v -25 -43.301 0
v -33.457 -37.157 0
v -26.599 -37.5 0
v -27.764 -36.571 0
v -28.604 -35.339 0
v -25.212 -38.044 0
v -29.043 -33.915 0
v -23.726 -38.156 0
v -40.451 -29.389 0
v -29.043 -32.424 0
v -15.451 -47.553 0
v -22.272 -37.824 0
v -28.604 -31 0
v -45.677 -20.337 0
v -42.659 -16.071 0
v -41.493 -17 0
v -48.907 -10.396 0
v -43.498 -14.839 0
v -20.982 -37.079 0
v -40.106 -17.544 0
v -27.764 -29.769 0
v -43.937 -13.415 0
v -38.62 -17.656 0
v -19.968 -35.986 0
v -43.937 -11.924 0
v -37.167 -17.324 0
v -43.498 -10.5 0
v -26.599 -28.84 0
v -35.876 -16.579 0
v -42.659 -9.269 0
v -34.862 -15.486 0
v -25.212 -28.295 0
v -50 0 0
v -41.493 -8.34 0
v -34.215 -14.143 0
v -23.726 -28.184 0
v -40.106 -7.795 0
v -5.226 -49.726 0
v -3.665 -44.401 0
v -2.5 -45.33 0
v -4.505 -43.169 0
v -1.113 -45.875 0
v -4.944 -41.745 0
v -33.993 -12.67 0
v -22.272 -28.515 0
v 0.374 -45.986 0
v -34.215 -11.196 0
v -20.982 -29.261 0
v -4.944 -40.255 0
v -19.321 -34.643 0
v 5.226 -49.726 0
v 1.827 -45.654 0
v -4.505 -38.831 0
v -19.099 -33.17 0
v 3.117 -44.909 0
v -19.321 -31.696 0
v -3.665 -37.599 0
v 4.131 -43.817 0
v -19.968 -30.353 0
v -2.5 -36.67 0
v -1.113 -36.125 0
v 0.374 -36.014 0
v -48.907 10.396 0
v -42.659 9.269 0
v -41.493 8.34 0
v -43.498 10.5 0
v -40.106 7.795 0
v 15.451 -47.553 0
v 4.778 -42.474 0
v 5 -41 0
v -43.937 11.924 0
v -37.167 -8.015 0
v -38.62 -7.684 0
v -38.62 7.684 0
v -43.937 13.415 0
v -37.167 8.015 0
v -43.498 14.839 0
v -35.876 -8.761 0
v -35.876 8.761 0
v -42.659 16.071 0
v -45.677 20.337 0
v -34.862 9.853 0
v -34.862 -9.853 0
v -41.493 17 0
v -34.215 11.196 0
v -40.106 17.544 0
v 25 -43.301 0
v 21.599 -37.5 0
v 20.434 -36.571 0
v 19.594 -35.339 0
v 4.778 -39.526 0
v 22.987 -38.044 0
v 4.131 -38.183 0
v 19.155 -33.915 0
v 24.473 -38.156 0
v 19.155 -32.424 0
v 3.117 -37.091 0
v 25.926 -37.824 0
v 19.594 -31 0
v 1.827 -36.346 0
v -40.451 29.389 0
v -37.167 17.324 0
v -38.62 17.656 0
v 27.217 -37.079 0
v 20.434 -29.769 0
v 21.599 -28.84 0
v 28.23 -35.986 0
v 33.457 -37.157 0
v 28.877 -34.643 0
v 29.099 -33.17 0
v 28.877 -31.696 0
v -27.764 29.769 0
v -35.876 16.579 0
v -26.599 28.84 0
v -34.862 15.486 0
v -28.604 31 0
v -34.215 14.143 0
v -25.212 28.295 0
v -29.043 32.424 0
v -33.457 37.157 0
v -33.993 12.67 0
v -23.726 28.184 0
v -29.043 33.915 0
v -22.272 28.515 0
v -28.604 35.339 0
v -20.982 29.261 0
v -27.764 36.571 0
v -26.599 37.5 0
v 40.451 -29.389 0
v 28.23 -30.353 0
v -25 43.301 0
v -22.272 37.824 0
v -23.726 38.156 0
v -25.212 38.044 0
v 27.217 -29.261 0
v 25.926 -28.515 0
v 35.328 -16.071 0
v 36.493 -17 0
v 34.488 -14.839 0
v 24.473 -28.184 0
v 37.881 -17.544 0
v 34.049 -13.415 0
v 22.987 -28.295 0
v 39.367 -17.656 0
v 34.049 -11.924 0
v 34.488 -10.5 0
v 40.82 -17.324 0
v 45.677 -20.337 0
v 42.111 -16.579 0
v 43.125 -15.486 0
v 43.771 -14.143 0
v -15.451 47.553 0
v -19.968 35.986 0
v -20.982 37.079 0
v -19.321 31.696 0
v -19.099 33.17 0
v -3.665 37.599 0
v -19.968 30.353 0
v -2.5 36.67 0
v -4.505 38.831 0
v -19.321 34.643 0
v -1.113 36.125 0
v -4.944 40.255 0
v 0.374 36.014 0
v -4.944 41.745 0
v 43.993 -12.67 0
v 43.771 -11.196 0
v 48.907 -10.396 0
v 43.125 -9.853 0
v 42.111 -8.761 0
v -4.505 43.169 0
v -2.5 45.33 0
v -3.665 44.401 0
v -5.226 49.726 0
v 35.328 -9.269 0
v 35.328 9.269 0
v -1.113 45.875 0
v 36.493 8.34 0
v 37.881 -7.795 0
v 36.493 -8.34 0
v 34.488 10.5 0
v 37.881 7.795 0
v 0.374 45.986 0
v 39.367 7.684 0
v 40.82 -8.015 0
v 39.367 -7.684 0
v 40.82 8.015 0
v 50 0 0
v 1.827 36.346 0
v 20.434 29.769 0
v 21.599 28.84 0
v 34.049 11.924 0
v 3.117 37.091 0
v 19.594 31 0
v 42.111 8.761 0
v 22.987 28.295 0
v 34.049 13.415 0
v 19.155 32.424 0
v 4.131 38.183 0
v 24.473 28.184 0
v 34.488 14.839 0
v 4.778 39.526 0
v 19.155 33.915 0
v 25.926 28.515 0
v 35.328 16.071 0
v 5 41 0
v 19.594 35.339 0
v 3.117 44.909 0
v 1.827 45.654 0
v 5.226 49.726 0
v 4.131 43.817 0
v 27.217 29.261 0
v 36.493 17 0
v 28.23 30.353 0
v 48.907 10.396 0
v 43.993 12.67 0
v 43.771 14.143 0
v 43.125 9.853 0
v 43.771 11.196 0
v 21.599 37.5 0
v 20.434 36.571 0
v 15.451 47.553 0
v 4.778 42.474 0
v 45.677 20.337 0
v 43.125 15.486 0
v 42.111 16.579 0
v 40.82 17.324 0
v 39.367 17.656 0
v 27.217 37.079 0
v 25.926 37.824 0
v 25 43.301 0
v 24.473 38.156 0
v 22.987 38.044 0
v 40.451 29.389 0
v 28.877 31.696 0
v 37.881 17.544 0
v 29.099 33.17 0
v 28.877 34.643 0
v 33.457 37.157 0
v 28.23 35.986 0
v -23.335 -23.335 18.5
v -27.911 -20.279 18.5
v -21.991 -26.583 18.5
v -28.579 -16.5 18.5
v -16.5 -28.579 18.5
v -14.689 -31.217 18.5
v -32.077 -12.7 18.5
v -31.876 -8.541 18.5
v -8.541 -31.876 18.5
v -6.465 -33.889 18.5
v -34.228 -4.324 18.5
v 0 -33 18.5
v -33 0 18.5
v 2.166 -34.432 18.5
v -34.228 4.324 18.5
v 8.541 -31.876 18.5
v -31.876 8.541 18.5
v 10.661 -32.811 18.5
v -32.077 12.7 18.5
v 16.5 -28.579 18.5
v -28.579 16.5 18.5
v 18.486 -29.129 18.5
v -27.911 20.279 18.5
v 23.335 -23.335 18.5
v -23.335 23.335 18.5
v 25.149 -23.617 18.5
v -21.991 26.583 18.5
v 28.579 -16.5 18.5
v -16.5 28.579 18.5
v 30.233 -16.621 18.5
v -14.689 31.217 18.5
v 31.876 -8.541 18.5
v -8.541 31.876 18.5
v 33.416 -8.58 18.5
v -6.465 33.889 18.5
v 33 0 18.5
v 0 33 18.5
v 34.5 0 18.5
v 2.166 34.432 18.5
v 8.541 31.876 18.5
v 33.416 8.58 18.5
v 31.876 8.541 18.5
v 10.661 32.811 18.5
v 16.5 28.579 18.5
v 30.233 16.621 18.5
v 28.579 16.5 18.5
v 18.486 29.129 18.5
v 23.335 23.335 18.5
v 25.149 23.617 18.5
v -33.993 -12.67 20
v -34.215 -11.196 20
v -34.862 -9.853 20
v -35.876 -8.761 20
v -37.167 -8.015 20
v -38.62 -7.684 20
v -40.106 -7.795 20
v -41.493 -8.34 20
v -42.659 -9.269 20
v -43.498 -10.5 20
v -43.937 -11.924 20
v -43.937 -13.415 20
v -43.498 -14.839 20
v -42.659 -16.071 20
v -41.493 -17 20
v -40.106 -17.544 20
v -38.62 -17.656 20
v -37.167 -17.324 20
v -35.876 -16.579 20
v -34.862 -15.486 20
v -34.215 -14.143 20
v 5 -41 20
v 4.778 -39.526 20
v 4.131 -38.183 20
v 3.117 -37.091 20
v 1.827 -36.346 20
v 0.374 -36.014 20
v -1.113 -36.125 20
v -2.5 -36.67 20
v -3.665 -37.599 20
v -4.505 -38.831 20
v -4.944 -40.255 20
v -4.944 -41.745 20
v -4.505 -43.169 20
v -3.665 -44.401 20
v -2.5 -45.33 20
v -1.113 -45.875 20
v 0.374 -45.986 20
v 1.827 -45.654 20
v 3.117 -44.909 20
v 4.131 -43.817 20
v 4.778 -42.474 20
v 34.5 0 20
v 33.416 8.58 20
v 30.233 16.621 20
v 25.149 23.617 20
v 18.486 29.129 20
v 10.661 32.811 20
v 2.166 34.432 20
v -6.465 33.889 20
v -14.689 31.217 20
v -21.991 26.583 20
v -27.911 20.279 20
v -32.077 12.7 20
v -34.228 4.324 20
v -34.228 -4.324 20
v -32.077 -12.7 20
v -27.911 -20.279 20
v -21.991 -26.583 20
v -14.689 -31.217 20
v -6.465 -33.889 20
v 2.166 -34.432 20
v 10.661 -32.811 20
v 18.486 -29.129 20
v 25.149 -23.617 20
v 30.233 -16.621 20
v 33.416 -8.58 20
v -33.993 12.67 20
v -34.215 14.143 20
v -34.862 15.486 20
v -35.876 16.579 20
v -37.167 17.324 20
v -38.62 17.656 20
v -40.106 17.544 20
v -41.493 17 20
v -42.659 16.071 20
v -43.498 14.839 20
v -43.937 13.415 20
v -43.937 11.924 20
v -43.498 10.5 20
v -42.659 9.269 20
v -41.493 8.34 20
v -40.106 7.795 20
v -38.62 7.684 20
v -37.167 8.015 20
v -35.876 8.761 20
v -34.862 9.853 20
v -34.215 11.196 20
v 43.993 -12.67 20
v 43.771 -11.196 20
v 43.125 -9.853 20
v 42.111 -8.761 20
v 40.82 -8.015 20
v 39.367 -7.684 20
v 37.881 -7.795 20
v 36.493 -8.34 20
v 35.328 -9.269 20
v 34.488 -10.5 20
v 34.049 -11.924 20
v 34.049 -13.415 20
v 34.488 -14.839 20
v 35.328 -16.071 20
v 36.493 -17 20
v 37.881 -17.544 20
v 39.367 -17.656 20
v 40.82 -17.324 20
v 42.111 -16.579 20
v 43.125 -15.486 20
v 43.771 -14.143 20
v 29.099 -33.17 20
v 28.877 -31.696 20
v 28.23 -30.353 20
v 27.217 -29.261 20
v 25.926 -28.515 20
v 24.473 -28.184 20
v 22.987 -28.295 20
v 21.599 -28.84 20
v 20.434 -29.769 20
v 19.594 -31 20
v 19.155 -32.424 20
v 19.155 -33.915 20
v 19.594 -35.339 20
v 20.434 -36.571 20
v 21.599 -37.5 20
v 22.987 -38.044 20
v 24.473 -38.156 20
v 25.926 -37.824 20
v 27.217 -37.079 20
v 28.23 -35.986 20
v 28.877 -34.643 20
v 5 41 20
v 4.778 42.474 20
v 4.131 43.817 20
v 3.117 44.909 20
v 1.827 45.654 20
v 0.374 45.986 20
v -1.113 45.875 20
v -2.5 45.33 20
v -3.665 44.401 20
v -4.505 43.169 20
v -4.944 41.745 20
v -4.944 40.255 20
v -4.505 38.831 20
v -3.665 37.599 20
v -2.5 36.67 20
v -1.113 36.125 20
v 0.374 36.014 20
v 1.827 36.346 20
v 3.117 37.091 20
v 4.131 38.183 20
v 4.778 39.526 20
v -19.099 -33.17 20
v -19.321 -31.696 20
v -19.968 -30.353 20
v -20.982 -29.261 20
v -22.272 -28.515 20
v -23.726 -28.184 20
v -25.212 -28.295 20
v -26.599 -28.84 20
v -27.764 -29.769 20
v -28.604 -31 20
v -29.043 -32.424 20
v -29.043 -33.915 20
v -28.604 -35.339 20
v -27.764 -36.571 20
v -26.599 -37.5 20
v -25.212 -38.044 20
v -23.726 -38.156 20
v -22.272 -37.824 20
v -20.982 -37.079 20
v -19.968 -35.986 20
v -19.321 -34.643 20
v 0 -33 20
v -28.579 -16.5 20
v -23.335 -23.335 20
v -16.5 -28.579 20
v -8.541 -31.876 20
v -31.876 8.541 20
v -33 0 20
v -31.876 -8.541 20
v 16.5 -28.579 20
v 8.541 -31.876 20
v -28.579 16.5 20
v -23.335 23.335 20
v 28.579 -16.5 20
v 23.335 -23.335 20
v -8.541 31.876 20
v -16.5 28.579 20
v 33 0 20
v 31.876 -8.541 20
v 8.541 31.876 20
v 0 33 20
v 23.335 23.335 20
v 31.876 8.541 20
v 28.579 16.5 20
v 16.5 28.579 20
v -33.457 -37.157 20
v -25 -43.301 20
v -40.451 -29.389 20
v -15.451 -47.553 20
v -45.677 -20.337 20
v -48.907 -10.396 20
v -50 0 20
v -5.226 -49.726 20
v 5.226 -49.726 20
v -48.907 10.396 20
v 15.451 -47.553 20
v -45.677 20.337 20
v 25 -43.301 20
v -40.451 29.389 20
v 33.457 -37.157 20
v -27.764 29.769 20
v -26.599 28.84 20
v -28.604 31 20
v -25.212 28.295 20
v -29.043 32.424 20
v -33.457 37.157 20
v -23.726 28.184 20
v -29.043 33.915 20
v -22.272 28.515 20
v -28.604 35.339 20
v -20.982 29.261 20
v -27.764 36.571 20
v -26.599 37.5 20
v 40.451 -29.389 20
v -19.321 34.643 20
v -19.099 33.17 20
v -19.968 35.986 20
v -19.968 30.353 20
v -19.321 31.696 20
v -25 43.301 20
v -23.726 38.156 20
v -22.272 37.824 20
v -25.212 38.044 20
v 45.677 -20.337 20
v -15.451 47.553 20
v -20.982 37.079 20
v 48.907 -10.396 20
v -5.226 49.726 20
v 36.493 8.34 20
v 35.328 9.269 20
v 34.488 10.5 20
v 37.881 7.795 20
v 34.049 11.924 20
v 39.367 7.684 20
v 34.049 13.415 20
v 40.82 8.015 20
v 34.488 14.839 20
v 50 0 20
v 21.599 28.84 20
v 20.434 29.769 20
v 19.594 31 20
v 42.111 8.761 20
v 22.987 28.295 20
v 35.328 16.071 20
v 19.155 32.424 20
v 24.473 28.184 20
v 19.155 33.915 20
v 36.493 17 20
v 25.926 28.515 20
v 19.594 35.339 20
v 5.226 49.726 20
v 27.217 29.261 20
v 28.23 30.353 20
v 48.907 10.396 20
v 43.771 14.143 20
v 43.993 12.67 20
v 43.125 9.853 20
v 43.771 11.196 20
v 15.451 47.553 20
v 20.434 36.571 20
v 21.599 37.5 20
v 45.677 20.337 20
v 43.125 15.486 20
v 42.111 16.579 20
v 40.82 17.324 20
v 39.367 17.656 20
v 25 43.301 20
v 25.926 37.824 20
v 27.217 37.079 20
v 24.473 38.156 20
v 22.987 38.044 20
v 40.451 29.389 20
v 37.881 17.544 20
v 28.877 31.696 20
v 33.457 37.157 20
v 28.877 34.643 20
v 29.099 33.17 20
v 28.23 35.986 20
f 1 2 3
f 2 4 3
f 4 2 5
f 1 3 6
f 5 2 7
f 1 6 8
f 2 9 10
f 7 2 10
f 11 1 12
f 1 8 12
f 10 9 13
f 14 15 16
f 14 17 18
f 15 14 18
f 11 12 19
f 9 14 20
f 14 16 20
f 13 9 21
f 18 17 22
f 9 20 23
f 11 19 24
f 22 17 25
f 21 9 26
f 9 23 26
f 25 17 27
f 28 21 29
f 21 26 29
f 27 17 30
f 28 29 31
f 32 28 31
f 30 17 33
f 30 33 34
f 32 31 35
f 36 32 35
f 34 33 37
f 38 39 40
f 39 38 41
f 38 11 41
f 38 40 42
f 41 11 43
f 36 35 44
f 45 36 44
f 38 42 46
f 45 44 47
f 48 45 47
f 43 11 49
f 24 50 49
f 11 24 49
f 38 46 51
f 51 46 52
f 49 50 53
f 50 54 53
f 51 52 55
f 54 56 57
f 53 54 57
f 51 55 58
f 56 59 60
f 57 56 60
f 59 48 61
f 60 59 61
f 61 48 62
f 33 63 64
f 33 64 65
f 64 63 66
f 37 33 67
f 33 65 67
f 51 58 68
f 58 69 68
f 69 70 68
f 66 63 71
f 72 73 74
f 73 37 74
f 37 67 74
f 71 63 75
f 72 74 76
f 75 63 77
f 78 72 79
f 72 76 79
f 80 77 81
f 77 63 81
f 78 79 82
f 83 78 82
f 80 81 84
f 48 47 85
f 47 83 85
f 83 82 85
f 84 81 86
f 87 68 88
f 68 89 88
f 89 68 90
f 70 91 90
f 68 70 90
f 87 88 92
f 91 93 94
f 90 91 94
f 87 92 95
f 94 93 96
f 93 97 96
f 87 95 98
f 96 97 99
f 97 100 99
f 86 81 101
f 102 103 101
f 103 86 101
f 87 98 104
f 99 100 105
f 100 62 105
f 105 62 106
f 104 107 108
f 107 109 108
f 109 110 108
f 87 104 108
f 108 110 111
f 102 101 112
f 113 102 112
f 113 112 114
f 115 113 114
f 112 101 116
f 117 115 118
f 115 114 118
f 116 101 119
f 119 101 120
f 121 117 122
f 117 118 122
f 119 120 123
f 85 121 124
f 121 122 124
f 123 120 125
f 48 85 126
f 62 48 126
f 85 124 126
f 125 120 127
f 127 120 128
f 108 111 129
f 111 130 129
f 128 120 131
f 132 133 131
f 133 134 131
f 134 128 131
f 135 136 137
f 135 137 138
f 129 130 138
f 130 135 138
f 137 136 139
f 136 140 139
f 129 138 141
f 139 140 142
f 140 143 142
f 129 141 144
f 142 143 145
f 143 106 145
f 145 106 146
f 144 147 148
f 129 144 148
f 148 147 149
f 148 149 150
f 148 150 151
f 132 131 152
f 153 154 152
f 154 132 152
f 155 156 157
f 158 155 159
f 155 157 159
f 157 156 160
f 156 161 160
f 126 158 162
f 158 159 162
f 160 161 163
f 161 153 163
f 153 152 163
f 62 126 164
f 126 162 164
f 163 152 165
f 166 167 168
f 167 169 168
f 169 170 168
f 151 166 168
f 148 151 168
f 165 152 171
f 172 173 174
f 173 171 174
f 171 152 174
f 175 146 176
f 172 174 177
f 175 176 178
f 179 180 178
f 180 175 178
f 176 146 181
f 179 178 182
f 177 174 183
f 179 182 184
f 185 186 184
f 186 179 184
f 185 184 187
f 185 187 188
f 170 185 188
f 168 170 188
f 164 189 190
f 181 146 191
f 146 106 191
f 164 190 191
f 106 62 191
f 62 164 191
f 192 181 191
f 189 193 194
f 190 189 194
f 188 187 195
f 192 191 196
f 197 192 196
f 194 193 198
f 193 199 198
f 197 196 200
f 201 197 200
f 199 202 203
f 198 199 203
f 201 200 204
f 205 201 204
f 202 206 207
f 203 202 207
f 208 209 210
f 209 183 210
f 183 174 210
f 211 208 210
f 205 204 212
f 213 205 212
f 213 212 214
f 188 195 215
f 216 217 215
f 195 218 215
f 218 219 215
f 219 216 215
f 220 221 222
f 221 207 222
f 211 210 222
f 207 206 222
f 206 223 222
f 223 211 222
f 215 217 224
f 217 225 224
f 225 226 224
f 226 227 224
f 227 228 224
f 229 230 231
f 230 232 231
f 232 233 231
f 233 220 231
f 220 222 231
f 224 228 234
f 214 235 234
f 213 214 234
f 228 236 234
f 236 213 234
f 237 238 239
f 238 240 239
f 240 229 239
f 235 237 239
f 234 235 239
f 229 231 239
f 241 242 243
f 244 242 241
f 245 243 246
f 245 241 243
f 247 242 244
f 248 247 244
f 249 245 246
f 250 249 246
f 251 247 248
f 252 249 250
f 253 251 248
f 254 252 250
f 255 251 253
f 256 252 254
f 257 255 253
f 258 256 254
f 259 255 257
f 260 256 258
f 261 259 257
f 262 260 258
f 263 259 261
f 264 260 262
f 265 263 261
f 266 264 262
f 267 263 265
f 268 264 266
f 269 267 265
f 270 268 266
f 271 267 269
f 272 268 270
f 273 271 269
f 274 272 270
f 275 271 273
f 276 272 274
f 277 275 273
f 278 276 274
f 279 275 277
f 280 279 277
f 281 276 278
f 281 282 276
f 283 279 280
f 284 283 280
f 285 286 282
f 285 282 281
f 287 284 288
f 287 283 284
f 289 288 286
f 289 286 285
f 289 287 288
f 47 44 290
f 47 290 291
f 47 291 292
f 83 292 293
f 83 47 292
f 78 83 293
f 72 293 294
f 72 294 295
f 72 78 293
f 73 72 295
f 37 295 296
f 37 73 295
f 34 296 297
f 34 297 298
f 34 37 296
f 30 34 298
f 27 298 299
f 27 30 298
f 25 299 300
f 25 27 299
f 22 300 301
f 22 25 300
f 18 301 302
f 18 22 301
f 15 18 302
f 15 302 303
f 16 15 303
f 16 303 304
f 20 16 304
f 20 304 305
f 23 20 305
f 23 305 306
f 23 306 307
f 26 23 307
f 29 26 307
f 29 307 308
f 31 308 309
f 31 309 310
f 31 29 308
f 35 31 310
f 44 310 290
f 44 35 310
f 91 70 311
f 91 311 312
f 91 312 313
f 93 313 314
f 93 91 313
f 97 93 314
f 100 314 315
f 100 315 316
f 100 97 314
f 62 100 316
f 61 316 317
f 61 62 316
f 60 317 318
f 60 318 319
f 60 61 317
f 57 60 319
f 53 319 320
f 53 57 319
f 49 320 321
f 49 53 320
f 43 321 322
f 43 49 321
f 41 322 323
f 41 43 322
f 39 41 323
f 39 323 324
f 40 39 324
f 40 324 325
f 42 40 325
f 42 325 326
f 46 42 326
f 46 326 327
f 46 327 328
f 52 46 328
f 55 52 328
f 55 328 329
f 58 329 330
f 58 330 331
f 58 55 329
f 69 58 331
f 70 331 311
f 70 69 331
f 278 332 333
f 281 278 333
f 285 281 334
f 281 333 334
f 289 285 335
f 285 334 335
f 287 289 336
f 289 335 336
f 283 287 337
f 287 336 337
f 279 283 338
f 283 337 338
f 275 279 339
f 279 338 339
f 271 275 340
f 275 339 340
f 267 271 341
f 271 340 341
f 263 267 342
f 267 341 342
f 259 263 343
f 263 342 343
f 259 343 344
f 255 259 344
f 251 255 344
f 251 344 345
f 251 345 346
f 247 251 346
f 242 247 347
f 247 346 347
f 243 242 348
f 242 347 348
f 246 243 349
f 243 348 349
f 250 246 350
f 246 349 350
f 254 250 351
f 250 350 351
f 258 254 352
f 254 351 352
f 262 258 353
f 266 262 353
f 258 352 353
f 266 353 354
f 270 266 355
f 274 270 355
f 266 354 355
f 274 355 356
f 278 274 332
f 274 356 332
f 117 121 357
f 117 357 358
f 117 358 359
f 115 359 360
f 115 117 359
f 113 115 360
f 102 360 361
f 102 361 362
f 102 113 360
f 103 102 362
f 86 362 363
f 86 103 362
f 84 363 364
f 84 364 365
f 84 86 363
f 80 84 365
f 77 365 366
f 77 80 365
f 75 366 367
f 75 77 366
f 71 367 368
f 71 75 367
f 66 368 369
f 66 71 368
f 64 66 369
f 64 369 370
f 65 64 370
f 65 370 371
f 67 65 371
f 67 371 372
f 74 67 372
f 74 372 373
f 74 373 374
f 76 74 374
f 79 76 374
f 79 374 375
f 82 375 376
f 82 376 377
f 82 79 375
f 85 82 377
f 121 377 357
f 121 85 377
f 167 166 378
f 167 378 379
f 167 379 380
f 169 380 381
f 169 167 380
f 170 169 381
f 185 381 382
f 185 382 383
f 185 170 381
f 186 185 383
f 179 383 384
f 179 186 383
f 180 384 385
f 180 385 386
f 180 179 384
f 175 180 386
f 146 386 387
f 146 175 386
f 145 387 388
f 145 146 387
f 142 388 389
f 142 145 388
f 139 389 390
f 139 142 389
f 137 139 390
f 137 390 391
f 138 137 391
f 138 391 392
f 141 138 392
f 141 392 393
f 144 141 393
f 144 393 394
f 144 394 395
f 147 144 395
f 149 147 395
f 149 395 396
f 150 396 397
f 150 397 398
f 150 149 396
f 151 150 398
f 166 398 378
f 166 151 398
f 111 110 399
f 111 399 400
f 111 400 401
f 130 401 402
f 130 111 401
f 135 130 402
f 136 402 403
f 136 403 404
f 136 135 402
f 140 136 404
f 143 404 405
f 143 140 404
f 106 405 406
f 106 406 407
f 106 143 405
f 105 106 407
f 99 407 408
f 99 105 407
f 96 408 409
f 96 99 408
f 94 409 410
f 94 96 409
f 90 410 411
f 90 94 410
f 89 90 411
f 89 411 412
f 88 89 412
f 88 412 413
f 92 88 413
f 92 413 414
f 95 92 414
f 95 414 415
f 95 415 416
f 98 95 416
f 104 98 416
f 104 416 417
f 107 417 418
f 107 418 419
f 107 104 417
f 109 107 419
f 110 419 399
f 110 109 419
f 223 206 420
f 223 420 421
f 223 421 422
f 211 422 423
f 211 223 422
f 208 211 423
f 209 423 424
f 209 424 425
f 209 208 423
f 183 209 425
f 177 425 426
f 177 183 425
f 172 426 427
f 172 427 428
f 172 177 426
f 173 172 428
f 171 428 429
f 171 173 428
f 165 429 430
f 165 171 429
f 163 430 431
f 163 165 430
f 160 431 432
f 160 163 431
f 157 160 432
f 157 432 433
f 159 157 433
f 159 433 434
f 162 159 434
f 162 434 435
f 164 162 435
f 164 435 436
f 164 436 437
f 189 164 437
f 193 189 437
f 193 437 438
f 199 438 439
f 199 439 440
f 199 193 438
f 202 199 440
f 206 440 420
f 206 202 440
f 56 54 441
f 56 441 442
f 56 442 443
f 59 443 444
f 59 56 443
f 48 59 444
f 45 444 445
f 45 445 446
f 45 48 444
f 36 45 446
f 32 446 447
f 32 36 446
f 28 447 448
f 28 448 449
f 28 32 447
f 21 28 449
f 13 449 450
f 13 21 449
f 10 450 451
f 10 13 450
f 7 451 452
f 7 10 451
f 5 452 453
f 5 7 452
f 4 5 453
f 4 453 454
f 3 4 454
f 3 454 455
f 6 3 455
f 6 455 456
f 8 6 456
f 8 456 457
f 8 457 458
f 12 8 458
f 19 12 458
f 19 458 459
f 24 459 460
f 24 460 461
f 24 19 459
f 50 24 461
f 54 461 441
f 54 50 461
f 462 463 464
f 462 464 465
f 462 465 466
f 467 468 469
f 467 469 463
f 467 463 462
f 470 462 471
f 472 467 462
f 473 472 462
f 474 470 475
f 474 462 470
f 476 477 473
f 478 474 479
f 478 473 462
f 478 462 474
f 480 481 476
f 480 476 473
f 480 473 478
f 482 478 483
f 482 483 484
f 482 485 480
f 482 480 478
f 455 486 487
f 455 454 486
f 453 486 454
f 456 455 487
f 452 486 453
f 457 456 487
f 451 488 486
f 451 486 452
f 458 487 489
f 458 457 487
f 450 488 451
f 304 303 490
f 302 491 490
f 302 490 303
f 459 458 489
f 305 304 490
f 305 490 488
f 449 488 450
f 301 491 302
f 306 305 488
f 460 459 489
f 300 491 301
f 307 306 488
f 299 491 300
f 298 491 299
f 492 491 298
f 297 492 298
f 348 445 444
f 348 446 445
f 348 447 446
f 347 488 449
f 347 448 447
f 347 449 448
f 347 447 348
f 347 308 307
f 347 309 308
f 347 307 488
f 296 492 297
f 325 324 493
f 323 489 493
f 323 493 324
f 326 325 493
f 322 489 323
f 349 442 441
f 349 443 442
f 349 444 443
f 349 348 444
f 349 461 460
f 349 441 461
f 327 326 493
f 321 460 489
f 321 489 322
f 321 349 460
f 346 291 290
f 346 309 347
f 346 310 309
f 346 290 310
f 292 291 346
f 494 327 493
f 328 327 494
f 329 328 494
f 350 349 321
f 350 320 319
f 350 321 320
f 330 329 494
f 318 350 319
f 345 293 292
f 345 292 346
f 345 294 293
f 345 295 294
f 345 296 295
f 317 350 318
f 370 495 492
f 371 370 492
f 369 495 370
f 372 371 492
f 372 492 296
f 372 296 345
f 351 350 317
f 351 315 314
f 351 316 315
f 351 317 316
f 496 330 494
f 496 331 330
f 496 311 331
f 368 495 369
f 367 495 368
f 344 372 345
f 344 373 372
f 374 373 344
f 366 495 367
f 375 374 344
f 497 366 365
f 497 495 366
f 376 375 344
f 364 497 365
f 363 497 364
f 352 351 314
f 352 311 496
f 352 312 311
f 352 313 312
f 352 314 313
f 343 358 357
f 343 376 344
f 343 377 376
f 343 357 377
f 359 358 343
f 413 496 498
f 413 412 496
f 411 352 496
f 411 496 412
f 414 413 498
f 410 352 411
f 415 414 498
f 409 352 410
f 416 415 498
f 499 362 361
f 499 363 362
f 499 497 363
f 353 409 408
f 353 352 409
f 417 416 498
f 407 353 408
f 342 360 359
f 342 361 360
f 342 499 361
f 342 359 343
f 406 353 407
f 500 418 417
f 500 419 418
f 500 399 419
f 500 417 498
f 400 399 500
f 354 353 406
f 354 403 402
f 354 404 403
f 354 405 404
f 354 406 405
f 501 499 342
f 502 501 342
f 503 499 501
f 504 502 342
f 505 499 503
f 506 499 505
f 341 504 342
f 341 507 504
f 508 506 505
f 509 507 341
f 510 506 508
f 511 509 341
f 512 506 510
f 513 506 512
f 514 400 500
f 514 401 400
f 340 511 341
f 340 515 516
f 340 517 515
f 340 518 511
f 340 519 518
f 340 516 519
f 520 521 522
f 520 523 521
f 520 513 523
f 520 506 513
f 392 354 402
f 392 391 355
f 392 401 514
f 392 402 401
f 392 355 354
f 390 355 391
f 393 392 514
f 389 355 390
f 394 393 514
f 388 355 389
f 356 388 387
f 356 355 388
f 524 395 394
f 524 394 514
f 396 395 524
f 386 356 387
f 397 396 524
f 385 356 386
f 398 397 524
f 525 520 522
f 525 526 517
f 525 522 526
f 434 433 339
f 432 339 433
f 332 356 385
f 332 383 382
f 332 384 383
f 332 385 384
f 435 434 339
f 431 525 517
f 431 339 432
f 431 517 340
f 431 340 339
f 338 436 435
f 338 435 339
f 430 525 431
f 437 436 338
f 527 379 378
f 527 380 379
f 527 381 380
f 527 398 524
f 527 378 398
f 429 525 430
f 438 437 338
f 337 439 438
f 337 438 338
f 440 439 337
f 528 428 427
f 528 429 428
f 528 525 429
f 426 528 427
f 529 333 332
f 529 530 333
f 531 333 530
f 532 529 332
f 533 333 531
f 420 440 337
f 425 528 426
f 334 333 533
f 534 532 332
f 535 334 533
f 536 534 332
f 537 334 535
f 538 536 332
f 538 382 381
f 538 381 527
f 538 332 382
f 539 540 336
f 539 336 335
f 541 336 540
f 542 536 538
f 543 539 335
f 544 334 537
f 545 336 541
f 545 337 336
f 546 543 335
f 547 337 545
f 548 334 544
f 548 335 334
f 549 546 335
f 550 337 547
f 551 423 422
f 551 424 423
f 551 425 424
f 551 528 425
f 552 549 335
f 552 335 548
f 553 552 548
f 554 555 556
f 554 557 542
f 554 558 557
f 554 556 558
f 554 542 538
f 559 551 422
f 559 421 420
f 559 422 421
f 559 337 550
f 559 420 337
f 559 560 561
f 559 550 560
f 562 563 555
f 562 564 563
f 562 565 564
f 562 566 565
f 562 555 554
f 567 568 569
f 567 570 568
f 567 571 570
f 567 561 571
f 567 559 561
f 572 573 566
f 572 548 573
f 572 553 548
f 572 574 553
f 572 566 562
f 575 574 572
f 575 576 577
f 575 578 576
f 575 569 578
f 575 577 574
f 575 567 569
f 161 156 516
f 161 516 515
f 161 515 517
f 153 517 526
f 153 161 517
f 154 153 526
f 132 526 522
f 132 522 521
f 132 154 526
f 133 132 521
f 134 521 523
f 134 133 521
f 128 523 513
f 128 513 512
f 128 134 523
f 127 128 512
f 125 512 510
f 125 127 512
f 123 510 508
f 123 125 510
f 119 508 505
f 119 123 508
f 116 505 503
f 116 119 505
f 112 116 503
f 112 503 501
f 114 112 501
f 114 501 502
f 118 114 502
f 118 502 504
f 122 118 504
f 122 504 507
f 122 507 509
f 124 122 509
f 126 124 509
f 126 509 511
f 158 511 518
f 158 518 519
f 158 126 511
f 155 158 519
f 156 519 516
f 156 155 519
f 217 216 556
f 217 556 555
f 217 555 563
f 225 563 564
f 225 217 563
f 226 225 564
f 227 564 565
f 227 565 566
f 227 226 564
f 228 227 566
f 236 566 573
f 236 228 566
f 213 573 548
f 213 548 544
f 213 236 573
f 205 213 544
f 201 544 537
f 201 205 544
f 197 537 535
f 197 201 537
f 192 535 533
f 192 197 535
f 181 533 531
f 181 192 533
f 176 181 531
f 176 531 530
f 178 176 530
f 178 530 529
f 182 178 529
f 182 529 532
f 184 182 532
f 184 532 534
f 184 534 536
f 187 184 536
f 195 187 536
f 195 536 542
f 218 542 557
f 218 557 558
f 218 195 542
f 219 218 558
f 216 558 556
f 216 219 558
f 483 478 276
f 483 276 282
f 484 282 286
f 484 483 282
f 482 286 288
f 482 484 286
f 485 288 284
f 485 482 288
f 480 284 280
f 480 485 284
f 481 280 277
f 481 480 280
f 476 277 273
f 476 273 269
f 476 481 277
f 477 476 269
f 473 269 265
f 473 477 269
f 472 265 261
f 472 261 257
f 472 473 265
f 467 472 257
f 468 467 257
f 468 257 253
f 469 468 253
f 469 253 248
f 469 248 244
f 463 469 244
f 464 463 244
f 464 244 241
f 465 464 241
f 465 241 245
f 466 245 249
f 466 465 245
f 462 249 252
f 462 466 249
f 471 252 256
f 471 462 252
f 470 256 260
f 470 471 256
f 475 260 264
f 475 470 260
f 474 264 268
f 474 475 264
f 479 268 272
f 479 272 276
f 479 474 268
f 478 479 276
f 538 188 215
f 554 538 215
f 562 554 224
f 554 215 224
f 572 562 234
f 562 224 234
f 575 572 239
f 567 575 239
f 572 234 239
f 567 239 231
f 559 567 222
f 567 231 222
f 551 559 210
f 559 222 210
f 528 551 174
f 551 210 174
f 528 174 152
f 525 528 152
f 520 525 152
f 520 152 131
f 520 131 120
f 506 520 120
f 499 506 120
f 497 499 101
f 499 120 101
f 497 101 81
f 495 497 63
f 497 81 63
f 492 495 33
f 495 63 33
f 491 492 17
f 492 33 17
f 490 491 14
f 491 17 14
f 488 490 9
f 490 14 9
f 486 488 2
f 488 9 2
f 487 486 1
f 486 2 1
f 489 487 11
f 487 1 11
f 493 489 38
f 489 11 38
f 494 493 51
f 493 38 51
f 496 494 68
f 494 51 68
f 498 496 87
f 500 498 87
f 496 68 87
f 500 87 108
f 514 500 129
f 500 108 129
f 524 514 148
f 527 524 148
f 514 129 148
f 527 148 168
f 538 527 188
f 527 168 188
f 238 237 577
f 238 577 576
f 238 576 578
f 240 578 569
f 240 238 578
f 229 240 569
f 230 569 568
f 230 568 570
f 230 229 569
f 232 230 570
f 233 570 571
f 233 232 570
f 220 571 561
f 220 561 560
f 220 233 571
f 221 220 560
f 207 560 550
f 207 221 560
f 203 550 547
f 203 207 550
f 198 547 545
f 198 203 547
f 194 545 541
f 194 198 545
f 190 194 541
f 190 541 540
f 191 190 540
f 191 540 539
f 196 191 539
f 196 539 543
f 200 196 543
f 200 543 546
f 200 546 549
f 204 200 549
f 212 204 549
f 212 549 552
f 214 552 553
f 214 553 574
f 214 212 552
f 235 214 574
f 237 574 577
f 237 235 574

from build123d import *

# Parameters (mm, degrees)
SKETCH1_R           = 50
SKETCH1_R_2         = 5
BOSS_EXTRUDE1_DEPTH = 20
SKETCH2_R           = 34.5
SKETCH2_R_2         = 33
CUT_EXTRUDE1_DEPTH  = 1.5


with BuildPart() as part:
    # Sketch1 → Boss-Extrude1 (new body)
    with BuildSketch(Plane.XY):
        Circle(SKETCH1_R)
        with Locations((0, -41)):
            Circle(SKETCH1_R_2, mode=Mode.SUBTRACT)
        with Locations((-24.099195344, -33.169696769)):
            Circle(SKETCH1_R_2, mode=Mode.SUBTRACT)
        with Locations((-38.993317168, -12.669696769)):
            Circle(SKETCH1_R_2, mode=Mode.SUBTRACT)
        with Locations((-38.993317168, 12.669696769)):
            Circle(SKETCH1_R_2, mode=Mode.SUBTRACT)
        with Locations((-24.099195344, 33.169696769)):
            Circle(SKETCH1_R_2, mode=Mode.SUBTRACT)
        with Locations((0, 41)):
            Circle(SKETCH1_R_2, mode=Mode.SUBTRACT)
        with Locations((24.099195344, 33.169696769)):
            Circle(SKETCH1_R_2, mode=Mode.SUBTRACT)
        with Locations((38.993317168, 12.669696769)):
            Circle(SKETCH1_R_2, mode=Mode.SUBTRACT)
        with Locations((38.993317168, -12.669696769)):
            Circle(SKETCH1_R_2, mode=Mode.SUBTRACT)
        with Locations((24.099195344, -33.169696769)):
            Circle(SKETCH1_R_2, mode=Mode.SUBTRACT)
    extrude(amount=BOSS_EXTRUDE1_DEPTH)

    # Sketch2 → Cut-Extrude1 (cut)
    with BuildSketch(Plane.XY.offset(20)):
        Circle(SKETCH2_R)
        Circle(SKETCH2_R_2, mode=Mode.SUBTRACT)
    extrude(amount=-CUT_EXTRUDE1_DEPTH, mode=Mode.SUBTRACT)


solid = part.part
